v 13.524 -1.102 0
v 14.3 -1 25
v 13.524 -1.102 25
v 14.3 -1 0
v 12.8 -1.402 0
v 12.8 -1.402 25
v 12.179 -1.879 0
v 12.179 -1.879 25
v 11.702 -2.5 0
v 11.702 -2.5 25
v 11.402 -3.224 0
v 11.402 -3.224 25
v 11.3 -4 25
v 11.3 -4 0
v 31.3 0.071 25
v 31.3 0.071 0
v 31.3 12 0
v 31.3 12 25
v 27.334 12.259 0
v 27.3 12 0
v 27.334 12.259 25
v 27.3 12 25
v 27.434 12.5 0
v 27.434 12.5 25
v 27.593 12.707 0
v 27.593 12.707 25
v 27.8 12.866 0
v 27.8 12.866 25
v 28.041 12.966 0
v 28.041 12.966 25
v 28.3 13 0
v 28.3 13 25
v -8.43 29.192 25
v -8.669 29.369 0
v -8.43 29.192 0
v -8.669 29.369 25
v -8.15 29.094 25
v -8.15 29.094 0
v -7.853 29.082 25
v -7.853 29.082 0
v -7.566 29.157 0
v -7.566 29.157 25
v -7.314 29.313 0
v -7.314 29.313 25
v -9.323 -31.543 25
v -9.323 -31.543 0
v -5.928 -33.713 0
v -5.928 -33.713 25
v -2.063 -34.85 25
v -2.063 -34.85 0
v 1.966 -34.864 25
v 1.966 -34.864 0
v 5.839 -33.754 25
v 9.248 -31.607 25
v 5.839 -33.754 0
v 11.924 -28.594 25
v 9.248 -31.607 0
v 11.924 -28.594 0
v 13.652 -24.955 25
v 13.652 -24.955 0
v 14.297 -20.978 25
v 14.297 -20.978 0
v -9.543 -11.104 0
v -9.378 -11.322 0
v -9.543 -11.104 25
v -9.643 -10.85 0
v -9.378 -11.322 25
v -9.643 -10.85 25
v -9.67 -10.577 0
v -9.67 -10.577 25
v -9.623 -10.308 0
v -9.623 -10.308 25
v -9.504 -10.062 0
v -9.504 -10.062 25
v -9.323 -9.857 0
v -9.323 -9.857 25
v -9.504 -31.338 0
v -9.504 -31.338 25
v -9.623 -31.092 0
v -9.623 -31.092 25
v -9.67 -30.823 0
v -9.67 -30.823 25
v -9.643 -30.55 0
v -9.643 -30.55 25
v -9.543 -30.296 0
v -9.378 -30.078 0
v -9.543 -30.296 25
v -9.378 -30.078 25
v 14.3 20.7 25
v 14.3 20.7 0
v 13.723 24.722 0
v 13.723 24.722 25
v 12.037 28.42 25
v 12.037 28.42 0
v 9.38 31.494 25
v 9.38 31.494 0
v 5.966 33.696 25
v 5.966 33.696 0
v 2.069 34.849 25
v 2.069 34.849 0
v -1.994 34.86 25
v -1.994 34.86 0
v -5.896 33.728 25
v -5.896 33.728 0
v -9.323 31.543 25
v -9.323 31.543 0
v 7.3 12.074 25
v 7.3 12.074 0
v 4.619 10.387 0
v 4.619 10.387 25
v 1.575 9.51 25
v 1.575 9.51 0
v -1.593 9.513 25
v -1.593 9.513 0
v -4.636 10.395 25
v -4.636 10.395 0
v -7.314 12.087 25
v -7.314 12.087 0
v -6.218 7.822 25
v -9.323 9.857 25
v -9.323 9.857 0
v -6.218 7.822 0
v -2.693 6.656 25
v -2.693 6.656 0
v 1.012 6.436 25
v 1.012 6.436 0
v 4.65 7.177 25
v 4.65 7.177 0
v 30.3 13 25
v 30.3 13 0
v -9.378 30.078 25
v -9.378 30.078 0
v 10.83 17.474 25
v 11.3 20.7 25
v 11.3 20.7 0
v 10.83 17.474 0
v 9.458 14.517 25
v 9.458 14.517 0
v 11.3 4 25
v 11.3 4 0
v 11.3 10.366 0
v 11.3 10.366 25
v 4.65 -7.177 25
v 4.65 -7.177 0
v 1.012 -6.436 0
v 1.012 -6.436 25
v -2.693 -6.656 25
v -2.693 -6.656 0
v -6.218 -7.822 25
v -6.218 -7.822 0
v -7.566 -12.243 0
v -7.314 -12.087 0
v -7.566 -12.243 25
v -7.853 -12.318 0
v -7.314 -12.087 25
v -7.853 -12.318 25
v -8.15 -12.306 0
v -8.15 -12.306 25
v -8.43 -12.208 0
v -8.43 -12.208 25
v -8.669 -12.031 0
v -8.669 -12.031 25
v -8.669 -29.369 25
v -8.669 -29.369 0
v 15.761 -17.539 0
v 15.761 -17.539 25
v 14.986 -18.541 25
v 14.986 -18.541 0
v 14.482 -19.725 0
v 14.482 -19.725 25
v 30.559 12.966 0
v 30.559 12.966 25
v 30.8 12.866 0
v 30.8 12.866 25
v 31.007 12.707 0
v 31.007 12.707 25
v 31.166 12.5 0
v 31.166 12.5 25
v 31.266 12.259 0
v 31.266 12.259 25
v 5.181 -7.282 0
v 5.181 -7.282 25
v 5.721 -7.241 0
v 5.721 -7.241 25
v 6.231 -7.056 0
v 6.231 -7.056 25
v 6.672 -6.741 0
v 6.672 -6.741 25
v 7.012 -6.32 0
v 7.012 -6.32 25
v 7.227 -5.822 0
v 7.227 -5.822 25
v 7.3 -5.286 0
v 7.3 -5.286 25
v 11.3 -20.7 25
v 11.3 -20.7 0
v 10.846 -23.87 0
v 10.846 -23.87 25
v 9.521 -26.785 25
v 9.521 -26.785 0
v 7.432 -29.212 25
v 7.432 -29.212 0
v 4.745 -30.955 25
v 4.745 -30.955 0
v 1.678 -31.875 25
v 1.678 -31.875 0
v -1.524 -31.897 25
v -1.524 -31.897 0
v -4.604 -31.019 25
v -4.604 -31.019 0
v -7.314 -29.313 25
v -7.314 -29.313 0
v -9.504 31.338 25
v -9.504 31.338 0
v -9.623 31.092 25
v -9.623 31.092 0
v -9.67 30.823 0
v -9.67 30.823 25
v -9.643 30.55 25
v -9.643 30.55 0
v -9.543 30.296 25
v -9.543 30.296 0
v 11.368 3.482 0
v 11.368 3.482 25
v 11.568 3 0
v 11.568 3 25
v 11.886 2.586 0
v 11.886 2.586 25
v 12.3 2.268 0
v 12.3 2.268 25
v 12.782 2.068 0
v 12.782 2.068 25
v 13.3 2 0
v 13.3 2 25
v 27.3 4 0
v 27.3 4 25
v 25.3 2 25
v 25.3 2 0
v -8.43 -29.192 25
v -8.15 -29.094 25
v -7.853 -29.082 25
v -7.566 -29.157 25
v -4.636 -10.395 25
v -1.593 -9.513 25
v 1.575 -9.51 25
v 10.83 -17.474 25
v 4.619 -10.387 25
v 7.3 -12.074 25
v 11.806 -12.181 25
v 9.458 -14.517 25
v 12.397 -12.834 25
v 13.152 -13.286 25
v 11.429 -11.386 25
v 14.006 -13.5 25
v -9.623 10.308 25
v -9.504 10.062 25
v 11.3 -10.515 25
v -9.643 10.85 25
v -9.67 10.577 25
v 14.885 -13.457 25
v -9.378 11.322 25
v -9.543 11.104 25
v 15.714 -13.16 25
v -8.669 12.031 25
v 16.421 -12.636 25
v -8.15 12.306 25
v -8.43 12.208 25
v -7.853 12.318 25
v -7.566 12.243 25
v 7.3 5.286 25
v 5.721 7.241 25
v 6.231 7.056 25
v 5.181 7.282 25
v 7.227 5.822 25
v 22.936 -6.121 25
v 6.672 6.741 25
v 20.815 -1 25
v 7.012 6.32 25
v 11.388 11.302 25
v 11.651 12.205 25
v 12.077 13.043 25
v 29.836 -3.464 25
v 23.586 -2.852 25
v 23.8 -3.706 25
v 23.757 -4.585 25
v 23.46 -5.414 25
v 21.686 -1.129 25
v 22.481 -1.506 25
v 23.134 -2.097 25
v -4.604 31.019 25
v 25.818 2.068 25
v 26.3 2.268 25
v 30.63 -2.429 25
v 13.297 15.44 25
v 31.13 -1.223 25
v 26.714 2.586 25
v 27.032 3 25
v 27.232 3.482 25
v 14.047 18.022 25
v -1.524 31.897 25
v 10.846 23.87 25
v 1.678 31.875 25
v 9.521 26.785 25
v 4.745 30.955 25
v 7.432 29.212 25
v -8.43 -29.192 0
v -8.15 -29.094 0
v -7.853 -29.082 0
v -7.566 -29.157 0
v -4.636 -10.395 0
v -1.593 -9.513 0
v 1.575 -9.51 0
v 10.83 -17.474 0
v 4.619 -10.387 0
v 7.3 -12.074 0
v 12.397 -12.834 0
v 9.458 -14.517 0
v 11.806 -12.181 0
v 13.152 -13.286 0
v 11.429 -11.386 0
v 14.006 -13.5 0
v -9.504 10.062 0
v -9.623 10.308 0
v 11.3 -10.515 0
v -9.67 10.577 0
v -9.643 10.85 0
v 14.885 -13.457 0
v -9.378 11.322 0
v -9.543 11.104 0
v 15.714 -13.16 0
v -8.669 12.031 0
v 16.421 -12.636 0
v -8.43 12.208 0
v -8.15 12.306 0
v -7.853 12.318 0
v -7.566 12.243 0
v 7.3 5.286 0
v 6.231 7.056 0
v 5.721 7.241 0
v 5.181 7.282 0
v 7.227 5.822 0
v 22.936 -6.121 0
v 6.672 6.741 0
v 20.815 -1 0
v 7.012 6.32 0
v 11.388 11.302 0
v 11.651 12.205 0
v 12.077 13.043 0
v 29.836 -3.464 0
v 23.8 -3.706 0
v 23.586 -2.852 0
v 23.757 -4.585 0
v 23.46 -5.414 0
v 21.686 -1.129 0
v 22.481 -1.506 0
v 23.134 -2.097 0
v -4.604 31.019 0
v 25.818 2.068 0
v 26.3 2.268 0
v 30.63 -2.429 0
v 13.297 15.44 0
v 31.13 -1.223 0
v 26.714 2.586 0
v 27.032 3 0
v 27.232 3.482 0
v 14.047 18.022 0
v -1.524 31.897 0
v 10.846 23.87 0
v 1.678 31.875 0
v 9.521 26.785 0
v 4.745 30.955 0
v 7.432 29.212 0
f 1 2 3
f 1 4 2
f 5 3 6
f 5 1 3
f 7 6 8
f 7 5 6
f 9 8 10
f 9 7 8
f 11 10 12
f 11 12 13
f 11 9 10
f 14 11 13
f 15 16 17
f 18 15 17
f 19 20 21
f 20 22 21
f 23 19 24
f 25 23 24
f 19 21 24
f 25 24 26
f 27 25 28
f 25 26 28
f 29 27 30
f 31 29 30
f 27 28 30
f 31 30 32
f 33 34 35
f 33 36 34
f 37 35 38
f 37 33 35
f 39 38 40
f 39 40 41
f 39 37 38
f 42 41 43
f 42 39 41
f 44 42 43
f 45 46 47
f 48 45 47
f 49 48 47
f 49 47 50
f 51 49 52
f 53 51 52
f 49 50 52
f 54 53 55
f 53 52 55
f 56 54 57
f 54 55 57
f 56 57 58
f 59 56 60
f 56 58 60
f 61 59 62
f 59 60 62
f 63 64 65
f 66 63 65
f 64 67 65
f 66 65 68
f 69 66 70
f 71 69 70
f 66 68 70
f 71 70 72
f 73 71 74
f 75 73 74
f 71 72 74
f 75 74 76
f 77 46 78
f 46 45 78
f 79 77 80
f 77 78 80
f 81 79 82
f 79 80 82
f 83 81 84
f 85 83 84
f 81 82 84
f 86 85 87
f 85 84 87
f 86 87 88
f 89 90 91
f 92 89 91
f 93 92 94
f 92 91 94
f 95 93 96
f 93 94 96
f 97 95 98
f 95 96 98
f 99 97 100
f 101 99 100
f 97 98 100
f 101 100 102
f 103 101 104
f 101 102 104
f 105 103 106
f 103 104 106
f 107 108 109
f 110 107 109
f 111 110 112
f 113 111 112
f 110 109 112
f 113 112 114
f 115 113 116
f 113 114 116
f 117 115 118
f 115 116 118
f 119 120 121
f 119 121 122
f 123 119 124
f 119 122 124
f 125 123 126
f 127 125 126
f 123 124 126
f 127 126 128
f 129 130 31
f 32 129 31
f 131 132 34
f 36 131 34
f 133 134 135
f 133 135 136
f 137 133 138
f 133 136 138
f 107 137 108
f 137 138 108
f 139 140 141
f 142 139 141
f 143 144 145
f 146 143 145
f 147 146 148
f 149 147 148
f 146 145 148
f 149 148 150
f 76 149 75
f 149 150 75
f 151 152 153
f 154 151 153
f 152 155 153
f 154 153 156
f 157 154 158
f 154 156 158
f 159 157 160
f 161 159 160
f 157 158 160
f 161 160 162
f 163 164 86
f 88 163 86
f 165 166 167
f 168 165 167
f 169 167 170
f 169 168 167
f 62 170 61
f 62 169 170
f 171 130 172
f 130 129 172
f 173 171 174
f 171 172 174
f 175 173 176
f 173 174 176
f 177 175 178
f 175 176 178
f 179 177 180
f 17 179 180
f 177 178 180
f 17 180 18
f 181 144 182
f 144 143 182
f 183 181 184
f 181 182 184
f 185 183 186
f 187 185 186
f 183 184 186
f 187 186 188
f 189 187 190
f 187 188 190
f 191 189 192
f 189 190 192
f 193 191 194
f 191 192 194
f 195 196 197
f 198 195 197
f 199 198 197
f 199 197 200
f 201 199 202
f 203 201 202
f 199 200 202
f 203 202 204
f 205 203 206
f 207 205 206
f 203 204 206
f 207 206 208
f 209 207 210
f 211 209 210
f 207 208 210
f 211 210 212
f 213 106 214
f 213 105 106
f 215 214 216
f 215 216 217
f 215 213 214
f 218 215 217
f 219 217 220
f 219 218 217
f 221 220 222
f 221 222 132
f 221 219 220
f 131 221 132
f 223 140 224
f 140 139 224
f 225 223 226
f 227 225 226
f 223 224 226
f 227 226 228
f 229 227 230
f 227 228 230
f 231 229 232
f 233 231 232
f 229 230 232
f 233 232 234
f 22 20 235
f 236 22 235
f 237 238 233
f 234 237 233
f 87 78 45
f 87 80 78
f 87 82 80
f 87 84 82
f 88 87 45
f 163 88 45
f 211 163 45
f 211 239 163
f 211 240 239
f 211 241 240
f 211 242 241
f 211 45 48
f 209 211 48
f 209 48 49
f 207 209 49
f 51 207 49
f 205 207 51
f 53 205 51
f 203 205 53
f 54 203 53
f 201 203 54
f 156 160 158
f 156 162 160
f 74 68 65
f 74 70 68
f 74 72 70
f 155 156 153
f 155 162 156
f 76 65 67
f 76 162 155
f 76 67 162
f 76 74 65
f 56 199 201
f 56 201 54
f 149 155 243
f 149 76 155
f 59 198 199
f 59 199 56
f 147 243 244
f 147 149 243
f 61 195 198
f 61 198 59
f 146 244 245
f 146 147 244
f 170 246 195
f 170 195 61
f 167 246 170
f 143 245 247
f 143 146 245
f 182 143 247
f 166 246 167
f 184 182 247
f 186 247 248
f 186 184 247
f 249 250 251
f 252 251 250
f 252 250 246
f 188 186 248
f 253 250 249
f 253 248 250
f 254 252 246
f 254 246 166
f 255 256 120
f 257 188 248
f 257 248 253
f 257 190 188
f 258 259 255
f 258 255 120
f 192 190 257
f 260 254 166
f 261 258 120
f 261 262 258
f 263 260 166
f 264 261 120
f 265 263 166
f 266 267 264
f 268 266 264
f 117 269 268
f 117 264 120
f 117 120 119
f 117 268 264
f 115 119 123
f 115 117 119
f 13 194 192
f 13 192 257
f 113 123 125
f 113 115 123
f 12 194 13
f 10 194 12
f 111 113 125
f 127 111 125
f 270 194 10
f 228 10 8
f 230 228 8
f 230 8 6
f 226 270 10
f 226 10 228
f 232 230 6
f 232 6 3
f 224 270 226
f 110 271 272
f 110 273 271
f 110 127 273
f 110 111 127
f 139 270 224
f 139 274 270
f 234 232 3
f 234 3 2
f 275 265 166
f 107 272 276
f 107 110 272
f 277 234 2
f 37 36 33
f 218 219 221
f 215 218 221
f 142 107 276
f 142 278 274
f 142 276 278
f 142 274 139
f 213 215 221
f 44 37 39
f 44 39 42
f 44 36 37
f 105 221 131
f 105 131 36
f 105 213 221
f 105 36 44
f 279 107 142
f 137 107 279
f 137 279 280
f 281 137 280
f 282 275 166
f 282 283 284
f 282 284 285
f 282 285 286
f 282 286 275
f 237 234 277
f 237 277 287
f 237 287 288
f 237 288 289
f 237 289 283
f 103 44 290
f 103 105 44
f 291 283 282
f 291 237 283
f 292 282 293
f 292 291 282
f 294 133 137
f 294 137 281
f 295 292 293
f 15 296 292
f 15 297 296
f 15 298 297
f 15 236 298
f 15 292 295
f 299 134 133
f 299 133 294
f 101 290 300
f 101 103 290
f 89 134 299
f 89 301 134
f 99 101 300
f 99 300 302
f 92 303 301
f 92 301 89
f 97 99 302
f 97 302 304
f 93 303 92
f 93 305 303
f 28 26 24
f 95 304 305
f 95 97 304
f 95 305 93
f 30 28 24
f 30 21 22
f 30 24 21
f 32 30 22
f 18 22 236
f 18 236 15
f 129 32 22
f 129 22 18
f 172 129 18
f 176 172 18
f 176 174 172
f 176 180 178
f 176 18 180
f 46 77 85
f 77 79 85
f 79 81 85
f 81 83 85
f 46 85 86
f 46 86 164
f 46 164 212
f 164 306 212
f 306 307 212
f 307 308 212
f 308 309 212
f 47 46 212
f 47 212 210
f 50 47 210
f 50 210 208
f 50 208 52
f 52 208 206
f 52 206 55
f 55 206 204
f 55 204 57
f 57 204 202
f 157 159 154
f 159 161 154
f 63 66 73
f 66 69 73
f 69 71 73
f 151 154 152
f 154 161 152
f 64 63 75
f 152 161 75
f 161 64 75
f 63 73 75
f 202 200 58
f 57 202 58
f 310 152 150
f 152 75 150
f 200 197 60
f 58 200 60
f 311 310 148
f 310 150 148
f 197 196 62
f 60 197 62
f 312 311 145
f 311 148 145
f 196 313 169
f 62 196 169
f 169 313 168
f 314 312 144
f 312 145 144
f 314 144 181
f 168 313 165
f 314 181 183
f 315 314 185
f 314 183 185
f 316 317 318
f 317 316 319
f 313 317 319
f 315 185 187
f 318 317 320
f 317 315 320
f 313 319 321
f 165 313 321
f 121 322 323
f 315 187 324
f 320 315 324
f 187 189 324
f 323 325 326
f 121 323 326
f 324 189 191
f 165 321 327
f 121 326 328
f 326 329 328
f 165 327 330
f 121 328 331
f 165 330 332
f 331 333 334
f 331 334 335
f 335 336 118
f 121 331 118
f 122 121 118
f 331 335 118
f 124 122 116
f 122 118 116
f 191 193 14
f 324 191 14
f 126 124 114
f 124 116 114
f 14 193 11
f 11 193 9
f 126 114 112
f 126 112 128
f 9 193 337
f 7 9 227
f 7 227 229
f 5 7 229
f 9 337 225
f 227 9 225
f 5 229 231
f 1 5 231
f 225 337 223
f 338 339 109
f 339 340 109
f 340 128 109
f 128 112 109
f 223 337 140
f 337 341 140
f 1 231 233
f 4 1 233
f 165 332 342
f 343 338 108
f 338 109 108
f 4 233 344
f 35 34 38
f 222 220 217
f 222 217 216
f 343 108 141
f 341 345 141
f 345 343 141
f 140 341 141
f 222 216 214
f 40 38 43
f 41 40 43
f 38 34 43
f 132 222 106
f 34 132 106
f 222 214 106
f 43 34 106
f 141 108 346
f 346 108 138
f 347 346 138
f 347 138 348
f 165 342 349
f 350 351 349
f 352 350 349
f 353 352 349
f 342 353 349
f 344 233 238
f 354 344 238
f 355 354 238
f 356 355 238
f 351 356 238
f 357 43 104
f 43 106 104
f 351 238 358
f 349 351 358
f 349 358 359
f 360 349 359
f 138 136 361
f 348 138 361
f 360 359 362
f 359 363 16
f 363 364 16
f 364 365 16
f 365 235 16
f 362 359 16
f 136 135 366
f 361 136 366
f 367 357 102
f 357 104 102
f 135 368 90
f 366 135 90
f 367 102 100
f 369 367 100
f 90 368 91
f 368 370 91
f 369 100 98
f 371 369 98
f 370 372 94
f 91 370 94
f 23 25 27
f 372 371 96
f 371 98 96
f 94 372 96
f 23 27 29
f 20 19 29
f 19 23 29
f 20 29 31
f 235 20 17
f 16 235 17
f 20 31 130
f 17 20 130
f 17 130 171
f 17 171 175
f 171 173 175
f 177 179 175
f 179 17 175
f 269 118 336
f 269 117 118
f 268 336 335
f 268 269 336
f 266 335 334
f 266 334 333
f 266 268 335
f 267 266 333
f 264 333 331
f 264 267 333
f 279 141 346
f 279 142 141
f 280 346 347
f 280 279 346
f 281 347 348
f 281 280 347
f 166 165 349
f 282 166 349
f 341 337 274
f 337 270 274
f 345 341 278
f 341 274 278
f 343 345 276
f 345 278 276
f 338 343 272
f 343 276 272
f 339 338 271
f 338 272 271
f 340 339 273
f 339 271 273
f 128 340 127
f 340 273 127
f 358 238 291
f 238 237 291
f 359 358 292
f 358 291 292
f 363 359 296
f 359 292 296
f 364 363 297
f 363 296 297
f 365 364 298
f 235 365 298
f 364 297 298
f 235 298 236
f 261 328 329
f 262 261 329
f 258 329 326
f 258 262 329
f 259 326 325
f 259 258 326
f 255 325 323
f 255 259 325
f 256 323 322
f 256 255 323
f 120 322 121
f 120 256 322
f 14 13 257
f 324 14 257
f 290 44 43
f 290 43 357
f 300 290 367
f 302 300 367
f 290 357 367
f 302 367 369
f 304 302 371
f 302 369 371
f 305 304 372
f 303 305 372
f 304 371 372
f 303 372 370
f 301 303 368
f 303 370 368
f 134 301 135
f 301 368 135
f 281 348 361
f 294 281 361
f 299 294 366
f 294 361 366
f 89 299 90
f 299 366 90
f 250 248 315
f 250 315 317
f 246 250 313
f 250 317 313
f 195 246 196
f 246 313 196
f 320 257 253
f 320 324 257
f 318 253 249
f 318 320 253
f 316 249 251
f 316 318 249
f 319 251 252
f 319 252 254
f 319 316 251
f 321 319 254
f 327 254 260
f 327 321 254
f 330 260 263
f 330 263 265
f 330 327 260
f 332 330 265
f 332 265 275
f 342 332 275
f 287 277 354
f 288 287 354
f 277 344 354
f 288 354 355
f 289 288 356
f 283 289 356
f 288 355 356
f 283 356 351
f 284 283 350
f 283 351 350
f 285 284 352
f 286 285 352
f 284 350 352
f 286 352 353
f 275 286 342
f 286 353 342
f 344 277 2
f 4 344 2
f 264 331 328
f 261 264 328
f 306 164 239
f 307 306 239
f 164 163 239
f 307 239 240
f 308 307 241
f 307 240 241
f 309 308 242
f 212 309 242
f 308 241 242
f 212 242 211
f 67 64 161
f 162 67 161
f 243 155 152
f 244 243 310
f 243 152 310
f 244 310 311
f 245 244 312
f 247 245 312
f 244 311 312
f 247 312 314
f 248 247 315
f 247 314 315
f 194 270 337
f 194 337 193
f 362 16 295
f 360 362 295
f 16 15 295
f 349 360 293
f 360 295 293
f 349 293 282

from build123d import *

# Parameters (mm, degrees)
F1_DEPTH    = 25
F2_T4_DEPTH = 25
F3_R        = 2
F4_R        = 1
F5_R        = 5
F6_R        = 2
F8_DEPTH    = 25.001
F9_R        = 3


# Not quite as in the source:
# - a fillet or chamfer that OpenCascade refuses, or shapes differently, is made with other operations: its cross-section is extruded or revolved along the edge and cut away or added


with BuildPart() as f1:
    # F0 (on Top) → F1 (new body)
    with BuildSketch(Plane.XY):
        with BuildLine():
            ThreePointArc((11.3, -11.9364390799), (9.4662629179, -9.9817974282), (7.3, -8.4036590808))
            Line((7.3, -8.4036590808), (7.3, -12.0744565389))
            ThreePointArc((7.3, -12.0744565389), (10.2513413756, -15.9460542704), (11.3, -20.7))
            Line((11.3, -20.7), (11.3, -11.9364390799))
        make_face()
        with BuildLine():
            ThreePointArc((11.3, 11.9364390799), (9.4662629179, 9.9817974282), (7.3, 8.4036590808))
            Line((7.3, 8.4036590808), (7.3, -8.4036590808))
            ThreePointArc((7.3, -8.4036590808), (9.4662629179, -9.9817974282), (11.3, -11.9364390799))
            Line((11.3, -11.9364390799), (11.3, -2))
            Line((11.3, -2), (11.3, 2))
            Line((11.3, 2), (11.3, 11.9364390799))
        make_face()
        with BuildLine():
            ThreePointArc((11.3, 20.7), (10.2513413756, 15.9460542704), (7.3, 12.0744565389))
            Line((7.3, 12.0744565389), (7.3, 8.4036590808))
            ThreePointArc((7.3, 8.4036590808), (9.4662629179, 9.9817974282), (11.3, 11.9364390799))
            Line((11.3, 11.9364390799), (11.3, 20.7))
        make_face()
        with BuildLine():
            ThreePointArc((-7.9903066274, 28.6903066274), (4.3243227857, 31.1398387174), (11.3, 20.7))
            Line((11.3, 20.7), (11.3, 11.9364390799))
            ThreePointArc((11.3, 11.9364390799), (13.5292276202, 16.0685855292), (14.3, 20.7))
            ThreePointArc((14.3, 20.7), (5.4723730828, 33.9114773149), (-10.111626971, 30.811626971))
            Line((-10.111626971, 30.811626971), (-7.9903066274, 28.6903066274))
        make_face()
        with BuildLine():
            Line((7.3, 8.4036590808), (7.3, 12.0744565389))
            ThreePointArc((7.3, 12.0744565389), (-0.4690546543, 9.4097392532), (-7.9903066274, 12.7096933726))
            Line((-7.9903066274, 12.7096933726), (-10.111626971, 10.588373029))
            ThreePointArc((-10.111626971, 10.588373029), (-1.7803244971, 6.5112564092), (7.3, 8.4036590808))
        make_face()
        with BuildLine():
            Line((7.3, -12.0744565389), (7.3, -8.4036590808))
            ThreePointArc((7.3, -8.4036590808), (-1.7803244971, -6.5112564092), (-10.111626971, -10.588373029))
            Line((-10.111626971, -10.588373029), (-7.9903066274, -12.7096933726))
            ThreePointArc((-7.9903066274, -12.7096933726), (-0.4690546543, -9.4097392532), (7.3, -12.0744565389))
        make_face()
        with BuildLine():
            ThreePointArc((14.3, -20.7), (13.5292276202, -16.0685855292), (11.3, -11.9364390799))
            Line((11.3, -11.9364390799), (11.3, -20.7))
            ThreePointArc((11.3, -20.7), (4.3243227857, -31.1398387174), (-7.9903066274, -28.6903066274))
            Line((-7.9903066274, -28.6903066274), (-10.111626971, -30.811626971))
            ThreePointArc((-10.111626971, -30.811626971), (5.4723730828, -33.9114773149), (14.3, -20.7))
        make_face()
        Polygon((27.3, 2), (11.3, 2), (11.3, -2), (31.3, -2), (31.3, 13), (27.3, 13), align=None)
    extrude(amount=F1_DEPTH)

    # F2: chamfer of 20 on 1 edges, made by hand


with BuildPart() as f2_tool2:
    # F2_s3 → F2_t4 (new body)
    with BuildSketch(Plane.XY):
        Polygon((11.3, -22), (31.3, -2), (11.3, -2), align=None)
    extrude(amount=F2_T4_DEPTH)

    split(bisect_by=Plane.YZ.offset(31.3), keep=Keep.BOTTOM)


with BuildPart() as f1_1:
    add(f1.part)

    # F2_t1: union F2_tool2
    add(f2_tool2.part)

    # F3
    f3_edges = [f1_1.edges().sort_by_distance(p)[0] for p in [
        (27.3, 2, 12.5),
        (11.3, 2, 12.5),
    ]]
    fillet(f3_edges, radius=F3_R)

    # F4
    f4_edges = [f1_1.edges().sort_by_distance(p)[0] for p in [
        (31.3, 13, 12.5),
        (27.3, 13, 12.5),
        (-7.990307, -12.709693, 12.5),
        (-10.111627, -10.588373, 12.5),
        (-7.990307, -28.690307, 12.5),
        (-10.111627, -30.811627, 12.5),
        (-10.111627, 10.588373, 12.5),
        (-7.990307, 12.709693, 12.5),
        (-7.990307, 28.690307, 12.5),
        (-10.111627, 30.811627, 12.5),
    ]]
    fillet(f4_edges, radius=F4_R)

    # F5
    f5_edges = [f1_1.edges().sort_by_distance(p)[0] for p in [
        (11.3, 11.936439, 12.5),
        (31.3, -2, 12.5),
        (14.209172, -19.090828, 12.5),
    ]]
    fillet(f5_edges, radius=F5_R)

    # F6
    f6_edges = [f1_1.edges().sort_by_distance(p)[0] for p in [
        (7.3, 8.403659, 12.5),
        (7.3, -8.403659, 12.5),
    ]]
    fillet(f6_edges, radius=F6_R)

    # F7 (on face) → F8 (cut, through all)
    with BuildSketch(Plane.XY.offset(25)):
        Polygon((28.0573593129, -1), (11.3, -1), (11.3, -17.7573593129), align=None)
    extrude(amount=-F8_DEPTH, mode=Mode.SUBTRACT)

    # F9
    f9_edges = [f1_1.edges().sort_by_distance(p)[0] for p in [
        (11.3, -1, 12.5),
        (28.057359, -1, 12.5),
        (11.3, -17.757359, 12.5),
    ]]
    fillet(f9_edges, radius=F9_R)


solid = f1_1.part
